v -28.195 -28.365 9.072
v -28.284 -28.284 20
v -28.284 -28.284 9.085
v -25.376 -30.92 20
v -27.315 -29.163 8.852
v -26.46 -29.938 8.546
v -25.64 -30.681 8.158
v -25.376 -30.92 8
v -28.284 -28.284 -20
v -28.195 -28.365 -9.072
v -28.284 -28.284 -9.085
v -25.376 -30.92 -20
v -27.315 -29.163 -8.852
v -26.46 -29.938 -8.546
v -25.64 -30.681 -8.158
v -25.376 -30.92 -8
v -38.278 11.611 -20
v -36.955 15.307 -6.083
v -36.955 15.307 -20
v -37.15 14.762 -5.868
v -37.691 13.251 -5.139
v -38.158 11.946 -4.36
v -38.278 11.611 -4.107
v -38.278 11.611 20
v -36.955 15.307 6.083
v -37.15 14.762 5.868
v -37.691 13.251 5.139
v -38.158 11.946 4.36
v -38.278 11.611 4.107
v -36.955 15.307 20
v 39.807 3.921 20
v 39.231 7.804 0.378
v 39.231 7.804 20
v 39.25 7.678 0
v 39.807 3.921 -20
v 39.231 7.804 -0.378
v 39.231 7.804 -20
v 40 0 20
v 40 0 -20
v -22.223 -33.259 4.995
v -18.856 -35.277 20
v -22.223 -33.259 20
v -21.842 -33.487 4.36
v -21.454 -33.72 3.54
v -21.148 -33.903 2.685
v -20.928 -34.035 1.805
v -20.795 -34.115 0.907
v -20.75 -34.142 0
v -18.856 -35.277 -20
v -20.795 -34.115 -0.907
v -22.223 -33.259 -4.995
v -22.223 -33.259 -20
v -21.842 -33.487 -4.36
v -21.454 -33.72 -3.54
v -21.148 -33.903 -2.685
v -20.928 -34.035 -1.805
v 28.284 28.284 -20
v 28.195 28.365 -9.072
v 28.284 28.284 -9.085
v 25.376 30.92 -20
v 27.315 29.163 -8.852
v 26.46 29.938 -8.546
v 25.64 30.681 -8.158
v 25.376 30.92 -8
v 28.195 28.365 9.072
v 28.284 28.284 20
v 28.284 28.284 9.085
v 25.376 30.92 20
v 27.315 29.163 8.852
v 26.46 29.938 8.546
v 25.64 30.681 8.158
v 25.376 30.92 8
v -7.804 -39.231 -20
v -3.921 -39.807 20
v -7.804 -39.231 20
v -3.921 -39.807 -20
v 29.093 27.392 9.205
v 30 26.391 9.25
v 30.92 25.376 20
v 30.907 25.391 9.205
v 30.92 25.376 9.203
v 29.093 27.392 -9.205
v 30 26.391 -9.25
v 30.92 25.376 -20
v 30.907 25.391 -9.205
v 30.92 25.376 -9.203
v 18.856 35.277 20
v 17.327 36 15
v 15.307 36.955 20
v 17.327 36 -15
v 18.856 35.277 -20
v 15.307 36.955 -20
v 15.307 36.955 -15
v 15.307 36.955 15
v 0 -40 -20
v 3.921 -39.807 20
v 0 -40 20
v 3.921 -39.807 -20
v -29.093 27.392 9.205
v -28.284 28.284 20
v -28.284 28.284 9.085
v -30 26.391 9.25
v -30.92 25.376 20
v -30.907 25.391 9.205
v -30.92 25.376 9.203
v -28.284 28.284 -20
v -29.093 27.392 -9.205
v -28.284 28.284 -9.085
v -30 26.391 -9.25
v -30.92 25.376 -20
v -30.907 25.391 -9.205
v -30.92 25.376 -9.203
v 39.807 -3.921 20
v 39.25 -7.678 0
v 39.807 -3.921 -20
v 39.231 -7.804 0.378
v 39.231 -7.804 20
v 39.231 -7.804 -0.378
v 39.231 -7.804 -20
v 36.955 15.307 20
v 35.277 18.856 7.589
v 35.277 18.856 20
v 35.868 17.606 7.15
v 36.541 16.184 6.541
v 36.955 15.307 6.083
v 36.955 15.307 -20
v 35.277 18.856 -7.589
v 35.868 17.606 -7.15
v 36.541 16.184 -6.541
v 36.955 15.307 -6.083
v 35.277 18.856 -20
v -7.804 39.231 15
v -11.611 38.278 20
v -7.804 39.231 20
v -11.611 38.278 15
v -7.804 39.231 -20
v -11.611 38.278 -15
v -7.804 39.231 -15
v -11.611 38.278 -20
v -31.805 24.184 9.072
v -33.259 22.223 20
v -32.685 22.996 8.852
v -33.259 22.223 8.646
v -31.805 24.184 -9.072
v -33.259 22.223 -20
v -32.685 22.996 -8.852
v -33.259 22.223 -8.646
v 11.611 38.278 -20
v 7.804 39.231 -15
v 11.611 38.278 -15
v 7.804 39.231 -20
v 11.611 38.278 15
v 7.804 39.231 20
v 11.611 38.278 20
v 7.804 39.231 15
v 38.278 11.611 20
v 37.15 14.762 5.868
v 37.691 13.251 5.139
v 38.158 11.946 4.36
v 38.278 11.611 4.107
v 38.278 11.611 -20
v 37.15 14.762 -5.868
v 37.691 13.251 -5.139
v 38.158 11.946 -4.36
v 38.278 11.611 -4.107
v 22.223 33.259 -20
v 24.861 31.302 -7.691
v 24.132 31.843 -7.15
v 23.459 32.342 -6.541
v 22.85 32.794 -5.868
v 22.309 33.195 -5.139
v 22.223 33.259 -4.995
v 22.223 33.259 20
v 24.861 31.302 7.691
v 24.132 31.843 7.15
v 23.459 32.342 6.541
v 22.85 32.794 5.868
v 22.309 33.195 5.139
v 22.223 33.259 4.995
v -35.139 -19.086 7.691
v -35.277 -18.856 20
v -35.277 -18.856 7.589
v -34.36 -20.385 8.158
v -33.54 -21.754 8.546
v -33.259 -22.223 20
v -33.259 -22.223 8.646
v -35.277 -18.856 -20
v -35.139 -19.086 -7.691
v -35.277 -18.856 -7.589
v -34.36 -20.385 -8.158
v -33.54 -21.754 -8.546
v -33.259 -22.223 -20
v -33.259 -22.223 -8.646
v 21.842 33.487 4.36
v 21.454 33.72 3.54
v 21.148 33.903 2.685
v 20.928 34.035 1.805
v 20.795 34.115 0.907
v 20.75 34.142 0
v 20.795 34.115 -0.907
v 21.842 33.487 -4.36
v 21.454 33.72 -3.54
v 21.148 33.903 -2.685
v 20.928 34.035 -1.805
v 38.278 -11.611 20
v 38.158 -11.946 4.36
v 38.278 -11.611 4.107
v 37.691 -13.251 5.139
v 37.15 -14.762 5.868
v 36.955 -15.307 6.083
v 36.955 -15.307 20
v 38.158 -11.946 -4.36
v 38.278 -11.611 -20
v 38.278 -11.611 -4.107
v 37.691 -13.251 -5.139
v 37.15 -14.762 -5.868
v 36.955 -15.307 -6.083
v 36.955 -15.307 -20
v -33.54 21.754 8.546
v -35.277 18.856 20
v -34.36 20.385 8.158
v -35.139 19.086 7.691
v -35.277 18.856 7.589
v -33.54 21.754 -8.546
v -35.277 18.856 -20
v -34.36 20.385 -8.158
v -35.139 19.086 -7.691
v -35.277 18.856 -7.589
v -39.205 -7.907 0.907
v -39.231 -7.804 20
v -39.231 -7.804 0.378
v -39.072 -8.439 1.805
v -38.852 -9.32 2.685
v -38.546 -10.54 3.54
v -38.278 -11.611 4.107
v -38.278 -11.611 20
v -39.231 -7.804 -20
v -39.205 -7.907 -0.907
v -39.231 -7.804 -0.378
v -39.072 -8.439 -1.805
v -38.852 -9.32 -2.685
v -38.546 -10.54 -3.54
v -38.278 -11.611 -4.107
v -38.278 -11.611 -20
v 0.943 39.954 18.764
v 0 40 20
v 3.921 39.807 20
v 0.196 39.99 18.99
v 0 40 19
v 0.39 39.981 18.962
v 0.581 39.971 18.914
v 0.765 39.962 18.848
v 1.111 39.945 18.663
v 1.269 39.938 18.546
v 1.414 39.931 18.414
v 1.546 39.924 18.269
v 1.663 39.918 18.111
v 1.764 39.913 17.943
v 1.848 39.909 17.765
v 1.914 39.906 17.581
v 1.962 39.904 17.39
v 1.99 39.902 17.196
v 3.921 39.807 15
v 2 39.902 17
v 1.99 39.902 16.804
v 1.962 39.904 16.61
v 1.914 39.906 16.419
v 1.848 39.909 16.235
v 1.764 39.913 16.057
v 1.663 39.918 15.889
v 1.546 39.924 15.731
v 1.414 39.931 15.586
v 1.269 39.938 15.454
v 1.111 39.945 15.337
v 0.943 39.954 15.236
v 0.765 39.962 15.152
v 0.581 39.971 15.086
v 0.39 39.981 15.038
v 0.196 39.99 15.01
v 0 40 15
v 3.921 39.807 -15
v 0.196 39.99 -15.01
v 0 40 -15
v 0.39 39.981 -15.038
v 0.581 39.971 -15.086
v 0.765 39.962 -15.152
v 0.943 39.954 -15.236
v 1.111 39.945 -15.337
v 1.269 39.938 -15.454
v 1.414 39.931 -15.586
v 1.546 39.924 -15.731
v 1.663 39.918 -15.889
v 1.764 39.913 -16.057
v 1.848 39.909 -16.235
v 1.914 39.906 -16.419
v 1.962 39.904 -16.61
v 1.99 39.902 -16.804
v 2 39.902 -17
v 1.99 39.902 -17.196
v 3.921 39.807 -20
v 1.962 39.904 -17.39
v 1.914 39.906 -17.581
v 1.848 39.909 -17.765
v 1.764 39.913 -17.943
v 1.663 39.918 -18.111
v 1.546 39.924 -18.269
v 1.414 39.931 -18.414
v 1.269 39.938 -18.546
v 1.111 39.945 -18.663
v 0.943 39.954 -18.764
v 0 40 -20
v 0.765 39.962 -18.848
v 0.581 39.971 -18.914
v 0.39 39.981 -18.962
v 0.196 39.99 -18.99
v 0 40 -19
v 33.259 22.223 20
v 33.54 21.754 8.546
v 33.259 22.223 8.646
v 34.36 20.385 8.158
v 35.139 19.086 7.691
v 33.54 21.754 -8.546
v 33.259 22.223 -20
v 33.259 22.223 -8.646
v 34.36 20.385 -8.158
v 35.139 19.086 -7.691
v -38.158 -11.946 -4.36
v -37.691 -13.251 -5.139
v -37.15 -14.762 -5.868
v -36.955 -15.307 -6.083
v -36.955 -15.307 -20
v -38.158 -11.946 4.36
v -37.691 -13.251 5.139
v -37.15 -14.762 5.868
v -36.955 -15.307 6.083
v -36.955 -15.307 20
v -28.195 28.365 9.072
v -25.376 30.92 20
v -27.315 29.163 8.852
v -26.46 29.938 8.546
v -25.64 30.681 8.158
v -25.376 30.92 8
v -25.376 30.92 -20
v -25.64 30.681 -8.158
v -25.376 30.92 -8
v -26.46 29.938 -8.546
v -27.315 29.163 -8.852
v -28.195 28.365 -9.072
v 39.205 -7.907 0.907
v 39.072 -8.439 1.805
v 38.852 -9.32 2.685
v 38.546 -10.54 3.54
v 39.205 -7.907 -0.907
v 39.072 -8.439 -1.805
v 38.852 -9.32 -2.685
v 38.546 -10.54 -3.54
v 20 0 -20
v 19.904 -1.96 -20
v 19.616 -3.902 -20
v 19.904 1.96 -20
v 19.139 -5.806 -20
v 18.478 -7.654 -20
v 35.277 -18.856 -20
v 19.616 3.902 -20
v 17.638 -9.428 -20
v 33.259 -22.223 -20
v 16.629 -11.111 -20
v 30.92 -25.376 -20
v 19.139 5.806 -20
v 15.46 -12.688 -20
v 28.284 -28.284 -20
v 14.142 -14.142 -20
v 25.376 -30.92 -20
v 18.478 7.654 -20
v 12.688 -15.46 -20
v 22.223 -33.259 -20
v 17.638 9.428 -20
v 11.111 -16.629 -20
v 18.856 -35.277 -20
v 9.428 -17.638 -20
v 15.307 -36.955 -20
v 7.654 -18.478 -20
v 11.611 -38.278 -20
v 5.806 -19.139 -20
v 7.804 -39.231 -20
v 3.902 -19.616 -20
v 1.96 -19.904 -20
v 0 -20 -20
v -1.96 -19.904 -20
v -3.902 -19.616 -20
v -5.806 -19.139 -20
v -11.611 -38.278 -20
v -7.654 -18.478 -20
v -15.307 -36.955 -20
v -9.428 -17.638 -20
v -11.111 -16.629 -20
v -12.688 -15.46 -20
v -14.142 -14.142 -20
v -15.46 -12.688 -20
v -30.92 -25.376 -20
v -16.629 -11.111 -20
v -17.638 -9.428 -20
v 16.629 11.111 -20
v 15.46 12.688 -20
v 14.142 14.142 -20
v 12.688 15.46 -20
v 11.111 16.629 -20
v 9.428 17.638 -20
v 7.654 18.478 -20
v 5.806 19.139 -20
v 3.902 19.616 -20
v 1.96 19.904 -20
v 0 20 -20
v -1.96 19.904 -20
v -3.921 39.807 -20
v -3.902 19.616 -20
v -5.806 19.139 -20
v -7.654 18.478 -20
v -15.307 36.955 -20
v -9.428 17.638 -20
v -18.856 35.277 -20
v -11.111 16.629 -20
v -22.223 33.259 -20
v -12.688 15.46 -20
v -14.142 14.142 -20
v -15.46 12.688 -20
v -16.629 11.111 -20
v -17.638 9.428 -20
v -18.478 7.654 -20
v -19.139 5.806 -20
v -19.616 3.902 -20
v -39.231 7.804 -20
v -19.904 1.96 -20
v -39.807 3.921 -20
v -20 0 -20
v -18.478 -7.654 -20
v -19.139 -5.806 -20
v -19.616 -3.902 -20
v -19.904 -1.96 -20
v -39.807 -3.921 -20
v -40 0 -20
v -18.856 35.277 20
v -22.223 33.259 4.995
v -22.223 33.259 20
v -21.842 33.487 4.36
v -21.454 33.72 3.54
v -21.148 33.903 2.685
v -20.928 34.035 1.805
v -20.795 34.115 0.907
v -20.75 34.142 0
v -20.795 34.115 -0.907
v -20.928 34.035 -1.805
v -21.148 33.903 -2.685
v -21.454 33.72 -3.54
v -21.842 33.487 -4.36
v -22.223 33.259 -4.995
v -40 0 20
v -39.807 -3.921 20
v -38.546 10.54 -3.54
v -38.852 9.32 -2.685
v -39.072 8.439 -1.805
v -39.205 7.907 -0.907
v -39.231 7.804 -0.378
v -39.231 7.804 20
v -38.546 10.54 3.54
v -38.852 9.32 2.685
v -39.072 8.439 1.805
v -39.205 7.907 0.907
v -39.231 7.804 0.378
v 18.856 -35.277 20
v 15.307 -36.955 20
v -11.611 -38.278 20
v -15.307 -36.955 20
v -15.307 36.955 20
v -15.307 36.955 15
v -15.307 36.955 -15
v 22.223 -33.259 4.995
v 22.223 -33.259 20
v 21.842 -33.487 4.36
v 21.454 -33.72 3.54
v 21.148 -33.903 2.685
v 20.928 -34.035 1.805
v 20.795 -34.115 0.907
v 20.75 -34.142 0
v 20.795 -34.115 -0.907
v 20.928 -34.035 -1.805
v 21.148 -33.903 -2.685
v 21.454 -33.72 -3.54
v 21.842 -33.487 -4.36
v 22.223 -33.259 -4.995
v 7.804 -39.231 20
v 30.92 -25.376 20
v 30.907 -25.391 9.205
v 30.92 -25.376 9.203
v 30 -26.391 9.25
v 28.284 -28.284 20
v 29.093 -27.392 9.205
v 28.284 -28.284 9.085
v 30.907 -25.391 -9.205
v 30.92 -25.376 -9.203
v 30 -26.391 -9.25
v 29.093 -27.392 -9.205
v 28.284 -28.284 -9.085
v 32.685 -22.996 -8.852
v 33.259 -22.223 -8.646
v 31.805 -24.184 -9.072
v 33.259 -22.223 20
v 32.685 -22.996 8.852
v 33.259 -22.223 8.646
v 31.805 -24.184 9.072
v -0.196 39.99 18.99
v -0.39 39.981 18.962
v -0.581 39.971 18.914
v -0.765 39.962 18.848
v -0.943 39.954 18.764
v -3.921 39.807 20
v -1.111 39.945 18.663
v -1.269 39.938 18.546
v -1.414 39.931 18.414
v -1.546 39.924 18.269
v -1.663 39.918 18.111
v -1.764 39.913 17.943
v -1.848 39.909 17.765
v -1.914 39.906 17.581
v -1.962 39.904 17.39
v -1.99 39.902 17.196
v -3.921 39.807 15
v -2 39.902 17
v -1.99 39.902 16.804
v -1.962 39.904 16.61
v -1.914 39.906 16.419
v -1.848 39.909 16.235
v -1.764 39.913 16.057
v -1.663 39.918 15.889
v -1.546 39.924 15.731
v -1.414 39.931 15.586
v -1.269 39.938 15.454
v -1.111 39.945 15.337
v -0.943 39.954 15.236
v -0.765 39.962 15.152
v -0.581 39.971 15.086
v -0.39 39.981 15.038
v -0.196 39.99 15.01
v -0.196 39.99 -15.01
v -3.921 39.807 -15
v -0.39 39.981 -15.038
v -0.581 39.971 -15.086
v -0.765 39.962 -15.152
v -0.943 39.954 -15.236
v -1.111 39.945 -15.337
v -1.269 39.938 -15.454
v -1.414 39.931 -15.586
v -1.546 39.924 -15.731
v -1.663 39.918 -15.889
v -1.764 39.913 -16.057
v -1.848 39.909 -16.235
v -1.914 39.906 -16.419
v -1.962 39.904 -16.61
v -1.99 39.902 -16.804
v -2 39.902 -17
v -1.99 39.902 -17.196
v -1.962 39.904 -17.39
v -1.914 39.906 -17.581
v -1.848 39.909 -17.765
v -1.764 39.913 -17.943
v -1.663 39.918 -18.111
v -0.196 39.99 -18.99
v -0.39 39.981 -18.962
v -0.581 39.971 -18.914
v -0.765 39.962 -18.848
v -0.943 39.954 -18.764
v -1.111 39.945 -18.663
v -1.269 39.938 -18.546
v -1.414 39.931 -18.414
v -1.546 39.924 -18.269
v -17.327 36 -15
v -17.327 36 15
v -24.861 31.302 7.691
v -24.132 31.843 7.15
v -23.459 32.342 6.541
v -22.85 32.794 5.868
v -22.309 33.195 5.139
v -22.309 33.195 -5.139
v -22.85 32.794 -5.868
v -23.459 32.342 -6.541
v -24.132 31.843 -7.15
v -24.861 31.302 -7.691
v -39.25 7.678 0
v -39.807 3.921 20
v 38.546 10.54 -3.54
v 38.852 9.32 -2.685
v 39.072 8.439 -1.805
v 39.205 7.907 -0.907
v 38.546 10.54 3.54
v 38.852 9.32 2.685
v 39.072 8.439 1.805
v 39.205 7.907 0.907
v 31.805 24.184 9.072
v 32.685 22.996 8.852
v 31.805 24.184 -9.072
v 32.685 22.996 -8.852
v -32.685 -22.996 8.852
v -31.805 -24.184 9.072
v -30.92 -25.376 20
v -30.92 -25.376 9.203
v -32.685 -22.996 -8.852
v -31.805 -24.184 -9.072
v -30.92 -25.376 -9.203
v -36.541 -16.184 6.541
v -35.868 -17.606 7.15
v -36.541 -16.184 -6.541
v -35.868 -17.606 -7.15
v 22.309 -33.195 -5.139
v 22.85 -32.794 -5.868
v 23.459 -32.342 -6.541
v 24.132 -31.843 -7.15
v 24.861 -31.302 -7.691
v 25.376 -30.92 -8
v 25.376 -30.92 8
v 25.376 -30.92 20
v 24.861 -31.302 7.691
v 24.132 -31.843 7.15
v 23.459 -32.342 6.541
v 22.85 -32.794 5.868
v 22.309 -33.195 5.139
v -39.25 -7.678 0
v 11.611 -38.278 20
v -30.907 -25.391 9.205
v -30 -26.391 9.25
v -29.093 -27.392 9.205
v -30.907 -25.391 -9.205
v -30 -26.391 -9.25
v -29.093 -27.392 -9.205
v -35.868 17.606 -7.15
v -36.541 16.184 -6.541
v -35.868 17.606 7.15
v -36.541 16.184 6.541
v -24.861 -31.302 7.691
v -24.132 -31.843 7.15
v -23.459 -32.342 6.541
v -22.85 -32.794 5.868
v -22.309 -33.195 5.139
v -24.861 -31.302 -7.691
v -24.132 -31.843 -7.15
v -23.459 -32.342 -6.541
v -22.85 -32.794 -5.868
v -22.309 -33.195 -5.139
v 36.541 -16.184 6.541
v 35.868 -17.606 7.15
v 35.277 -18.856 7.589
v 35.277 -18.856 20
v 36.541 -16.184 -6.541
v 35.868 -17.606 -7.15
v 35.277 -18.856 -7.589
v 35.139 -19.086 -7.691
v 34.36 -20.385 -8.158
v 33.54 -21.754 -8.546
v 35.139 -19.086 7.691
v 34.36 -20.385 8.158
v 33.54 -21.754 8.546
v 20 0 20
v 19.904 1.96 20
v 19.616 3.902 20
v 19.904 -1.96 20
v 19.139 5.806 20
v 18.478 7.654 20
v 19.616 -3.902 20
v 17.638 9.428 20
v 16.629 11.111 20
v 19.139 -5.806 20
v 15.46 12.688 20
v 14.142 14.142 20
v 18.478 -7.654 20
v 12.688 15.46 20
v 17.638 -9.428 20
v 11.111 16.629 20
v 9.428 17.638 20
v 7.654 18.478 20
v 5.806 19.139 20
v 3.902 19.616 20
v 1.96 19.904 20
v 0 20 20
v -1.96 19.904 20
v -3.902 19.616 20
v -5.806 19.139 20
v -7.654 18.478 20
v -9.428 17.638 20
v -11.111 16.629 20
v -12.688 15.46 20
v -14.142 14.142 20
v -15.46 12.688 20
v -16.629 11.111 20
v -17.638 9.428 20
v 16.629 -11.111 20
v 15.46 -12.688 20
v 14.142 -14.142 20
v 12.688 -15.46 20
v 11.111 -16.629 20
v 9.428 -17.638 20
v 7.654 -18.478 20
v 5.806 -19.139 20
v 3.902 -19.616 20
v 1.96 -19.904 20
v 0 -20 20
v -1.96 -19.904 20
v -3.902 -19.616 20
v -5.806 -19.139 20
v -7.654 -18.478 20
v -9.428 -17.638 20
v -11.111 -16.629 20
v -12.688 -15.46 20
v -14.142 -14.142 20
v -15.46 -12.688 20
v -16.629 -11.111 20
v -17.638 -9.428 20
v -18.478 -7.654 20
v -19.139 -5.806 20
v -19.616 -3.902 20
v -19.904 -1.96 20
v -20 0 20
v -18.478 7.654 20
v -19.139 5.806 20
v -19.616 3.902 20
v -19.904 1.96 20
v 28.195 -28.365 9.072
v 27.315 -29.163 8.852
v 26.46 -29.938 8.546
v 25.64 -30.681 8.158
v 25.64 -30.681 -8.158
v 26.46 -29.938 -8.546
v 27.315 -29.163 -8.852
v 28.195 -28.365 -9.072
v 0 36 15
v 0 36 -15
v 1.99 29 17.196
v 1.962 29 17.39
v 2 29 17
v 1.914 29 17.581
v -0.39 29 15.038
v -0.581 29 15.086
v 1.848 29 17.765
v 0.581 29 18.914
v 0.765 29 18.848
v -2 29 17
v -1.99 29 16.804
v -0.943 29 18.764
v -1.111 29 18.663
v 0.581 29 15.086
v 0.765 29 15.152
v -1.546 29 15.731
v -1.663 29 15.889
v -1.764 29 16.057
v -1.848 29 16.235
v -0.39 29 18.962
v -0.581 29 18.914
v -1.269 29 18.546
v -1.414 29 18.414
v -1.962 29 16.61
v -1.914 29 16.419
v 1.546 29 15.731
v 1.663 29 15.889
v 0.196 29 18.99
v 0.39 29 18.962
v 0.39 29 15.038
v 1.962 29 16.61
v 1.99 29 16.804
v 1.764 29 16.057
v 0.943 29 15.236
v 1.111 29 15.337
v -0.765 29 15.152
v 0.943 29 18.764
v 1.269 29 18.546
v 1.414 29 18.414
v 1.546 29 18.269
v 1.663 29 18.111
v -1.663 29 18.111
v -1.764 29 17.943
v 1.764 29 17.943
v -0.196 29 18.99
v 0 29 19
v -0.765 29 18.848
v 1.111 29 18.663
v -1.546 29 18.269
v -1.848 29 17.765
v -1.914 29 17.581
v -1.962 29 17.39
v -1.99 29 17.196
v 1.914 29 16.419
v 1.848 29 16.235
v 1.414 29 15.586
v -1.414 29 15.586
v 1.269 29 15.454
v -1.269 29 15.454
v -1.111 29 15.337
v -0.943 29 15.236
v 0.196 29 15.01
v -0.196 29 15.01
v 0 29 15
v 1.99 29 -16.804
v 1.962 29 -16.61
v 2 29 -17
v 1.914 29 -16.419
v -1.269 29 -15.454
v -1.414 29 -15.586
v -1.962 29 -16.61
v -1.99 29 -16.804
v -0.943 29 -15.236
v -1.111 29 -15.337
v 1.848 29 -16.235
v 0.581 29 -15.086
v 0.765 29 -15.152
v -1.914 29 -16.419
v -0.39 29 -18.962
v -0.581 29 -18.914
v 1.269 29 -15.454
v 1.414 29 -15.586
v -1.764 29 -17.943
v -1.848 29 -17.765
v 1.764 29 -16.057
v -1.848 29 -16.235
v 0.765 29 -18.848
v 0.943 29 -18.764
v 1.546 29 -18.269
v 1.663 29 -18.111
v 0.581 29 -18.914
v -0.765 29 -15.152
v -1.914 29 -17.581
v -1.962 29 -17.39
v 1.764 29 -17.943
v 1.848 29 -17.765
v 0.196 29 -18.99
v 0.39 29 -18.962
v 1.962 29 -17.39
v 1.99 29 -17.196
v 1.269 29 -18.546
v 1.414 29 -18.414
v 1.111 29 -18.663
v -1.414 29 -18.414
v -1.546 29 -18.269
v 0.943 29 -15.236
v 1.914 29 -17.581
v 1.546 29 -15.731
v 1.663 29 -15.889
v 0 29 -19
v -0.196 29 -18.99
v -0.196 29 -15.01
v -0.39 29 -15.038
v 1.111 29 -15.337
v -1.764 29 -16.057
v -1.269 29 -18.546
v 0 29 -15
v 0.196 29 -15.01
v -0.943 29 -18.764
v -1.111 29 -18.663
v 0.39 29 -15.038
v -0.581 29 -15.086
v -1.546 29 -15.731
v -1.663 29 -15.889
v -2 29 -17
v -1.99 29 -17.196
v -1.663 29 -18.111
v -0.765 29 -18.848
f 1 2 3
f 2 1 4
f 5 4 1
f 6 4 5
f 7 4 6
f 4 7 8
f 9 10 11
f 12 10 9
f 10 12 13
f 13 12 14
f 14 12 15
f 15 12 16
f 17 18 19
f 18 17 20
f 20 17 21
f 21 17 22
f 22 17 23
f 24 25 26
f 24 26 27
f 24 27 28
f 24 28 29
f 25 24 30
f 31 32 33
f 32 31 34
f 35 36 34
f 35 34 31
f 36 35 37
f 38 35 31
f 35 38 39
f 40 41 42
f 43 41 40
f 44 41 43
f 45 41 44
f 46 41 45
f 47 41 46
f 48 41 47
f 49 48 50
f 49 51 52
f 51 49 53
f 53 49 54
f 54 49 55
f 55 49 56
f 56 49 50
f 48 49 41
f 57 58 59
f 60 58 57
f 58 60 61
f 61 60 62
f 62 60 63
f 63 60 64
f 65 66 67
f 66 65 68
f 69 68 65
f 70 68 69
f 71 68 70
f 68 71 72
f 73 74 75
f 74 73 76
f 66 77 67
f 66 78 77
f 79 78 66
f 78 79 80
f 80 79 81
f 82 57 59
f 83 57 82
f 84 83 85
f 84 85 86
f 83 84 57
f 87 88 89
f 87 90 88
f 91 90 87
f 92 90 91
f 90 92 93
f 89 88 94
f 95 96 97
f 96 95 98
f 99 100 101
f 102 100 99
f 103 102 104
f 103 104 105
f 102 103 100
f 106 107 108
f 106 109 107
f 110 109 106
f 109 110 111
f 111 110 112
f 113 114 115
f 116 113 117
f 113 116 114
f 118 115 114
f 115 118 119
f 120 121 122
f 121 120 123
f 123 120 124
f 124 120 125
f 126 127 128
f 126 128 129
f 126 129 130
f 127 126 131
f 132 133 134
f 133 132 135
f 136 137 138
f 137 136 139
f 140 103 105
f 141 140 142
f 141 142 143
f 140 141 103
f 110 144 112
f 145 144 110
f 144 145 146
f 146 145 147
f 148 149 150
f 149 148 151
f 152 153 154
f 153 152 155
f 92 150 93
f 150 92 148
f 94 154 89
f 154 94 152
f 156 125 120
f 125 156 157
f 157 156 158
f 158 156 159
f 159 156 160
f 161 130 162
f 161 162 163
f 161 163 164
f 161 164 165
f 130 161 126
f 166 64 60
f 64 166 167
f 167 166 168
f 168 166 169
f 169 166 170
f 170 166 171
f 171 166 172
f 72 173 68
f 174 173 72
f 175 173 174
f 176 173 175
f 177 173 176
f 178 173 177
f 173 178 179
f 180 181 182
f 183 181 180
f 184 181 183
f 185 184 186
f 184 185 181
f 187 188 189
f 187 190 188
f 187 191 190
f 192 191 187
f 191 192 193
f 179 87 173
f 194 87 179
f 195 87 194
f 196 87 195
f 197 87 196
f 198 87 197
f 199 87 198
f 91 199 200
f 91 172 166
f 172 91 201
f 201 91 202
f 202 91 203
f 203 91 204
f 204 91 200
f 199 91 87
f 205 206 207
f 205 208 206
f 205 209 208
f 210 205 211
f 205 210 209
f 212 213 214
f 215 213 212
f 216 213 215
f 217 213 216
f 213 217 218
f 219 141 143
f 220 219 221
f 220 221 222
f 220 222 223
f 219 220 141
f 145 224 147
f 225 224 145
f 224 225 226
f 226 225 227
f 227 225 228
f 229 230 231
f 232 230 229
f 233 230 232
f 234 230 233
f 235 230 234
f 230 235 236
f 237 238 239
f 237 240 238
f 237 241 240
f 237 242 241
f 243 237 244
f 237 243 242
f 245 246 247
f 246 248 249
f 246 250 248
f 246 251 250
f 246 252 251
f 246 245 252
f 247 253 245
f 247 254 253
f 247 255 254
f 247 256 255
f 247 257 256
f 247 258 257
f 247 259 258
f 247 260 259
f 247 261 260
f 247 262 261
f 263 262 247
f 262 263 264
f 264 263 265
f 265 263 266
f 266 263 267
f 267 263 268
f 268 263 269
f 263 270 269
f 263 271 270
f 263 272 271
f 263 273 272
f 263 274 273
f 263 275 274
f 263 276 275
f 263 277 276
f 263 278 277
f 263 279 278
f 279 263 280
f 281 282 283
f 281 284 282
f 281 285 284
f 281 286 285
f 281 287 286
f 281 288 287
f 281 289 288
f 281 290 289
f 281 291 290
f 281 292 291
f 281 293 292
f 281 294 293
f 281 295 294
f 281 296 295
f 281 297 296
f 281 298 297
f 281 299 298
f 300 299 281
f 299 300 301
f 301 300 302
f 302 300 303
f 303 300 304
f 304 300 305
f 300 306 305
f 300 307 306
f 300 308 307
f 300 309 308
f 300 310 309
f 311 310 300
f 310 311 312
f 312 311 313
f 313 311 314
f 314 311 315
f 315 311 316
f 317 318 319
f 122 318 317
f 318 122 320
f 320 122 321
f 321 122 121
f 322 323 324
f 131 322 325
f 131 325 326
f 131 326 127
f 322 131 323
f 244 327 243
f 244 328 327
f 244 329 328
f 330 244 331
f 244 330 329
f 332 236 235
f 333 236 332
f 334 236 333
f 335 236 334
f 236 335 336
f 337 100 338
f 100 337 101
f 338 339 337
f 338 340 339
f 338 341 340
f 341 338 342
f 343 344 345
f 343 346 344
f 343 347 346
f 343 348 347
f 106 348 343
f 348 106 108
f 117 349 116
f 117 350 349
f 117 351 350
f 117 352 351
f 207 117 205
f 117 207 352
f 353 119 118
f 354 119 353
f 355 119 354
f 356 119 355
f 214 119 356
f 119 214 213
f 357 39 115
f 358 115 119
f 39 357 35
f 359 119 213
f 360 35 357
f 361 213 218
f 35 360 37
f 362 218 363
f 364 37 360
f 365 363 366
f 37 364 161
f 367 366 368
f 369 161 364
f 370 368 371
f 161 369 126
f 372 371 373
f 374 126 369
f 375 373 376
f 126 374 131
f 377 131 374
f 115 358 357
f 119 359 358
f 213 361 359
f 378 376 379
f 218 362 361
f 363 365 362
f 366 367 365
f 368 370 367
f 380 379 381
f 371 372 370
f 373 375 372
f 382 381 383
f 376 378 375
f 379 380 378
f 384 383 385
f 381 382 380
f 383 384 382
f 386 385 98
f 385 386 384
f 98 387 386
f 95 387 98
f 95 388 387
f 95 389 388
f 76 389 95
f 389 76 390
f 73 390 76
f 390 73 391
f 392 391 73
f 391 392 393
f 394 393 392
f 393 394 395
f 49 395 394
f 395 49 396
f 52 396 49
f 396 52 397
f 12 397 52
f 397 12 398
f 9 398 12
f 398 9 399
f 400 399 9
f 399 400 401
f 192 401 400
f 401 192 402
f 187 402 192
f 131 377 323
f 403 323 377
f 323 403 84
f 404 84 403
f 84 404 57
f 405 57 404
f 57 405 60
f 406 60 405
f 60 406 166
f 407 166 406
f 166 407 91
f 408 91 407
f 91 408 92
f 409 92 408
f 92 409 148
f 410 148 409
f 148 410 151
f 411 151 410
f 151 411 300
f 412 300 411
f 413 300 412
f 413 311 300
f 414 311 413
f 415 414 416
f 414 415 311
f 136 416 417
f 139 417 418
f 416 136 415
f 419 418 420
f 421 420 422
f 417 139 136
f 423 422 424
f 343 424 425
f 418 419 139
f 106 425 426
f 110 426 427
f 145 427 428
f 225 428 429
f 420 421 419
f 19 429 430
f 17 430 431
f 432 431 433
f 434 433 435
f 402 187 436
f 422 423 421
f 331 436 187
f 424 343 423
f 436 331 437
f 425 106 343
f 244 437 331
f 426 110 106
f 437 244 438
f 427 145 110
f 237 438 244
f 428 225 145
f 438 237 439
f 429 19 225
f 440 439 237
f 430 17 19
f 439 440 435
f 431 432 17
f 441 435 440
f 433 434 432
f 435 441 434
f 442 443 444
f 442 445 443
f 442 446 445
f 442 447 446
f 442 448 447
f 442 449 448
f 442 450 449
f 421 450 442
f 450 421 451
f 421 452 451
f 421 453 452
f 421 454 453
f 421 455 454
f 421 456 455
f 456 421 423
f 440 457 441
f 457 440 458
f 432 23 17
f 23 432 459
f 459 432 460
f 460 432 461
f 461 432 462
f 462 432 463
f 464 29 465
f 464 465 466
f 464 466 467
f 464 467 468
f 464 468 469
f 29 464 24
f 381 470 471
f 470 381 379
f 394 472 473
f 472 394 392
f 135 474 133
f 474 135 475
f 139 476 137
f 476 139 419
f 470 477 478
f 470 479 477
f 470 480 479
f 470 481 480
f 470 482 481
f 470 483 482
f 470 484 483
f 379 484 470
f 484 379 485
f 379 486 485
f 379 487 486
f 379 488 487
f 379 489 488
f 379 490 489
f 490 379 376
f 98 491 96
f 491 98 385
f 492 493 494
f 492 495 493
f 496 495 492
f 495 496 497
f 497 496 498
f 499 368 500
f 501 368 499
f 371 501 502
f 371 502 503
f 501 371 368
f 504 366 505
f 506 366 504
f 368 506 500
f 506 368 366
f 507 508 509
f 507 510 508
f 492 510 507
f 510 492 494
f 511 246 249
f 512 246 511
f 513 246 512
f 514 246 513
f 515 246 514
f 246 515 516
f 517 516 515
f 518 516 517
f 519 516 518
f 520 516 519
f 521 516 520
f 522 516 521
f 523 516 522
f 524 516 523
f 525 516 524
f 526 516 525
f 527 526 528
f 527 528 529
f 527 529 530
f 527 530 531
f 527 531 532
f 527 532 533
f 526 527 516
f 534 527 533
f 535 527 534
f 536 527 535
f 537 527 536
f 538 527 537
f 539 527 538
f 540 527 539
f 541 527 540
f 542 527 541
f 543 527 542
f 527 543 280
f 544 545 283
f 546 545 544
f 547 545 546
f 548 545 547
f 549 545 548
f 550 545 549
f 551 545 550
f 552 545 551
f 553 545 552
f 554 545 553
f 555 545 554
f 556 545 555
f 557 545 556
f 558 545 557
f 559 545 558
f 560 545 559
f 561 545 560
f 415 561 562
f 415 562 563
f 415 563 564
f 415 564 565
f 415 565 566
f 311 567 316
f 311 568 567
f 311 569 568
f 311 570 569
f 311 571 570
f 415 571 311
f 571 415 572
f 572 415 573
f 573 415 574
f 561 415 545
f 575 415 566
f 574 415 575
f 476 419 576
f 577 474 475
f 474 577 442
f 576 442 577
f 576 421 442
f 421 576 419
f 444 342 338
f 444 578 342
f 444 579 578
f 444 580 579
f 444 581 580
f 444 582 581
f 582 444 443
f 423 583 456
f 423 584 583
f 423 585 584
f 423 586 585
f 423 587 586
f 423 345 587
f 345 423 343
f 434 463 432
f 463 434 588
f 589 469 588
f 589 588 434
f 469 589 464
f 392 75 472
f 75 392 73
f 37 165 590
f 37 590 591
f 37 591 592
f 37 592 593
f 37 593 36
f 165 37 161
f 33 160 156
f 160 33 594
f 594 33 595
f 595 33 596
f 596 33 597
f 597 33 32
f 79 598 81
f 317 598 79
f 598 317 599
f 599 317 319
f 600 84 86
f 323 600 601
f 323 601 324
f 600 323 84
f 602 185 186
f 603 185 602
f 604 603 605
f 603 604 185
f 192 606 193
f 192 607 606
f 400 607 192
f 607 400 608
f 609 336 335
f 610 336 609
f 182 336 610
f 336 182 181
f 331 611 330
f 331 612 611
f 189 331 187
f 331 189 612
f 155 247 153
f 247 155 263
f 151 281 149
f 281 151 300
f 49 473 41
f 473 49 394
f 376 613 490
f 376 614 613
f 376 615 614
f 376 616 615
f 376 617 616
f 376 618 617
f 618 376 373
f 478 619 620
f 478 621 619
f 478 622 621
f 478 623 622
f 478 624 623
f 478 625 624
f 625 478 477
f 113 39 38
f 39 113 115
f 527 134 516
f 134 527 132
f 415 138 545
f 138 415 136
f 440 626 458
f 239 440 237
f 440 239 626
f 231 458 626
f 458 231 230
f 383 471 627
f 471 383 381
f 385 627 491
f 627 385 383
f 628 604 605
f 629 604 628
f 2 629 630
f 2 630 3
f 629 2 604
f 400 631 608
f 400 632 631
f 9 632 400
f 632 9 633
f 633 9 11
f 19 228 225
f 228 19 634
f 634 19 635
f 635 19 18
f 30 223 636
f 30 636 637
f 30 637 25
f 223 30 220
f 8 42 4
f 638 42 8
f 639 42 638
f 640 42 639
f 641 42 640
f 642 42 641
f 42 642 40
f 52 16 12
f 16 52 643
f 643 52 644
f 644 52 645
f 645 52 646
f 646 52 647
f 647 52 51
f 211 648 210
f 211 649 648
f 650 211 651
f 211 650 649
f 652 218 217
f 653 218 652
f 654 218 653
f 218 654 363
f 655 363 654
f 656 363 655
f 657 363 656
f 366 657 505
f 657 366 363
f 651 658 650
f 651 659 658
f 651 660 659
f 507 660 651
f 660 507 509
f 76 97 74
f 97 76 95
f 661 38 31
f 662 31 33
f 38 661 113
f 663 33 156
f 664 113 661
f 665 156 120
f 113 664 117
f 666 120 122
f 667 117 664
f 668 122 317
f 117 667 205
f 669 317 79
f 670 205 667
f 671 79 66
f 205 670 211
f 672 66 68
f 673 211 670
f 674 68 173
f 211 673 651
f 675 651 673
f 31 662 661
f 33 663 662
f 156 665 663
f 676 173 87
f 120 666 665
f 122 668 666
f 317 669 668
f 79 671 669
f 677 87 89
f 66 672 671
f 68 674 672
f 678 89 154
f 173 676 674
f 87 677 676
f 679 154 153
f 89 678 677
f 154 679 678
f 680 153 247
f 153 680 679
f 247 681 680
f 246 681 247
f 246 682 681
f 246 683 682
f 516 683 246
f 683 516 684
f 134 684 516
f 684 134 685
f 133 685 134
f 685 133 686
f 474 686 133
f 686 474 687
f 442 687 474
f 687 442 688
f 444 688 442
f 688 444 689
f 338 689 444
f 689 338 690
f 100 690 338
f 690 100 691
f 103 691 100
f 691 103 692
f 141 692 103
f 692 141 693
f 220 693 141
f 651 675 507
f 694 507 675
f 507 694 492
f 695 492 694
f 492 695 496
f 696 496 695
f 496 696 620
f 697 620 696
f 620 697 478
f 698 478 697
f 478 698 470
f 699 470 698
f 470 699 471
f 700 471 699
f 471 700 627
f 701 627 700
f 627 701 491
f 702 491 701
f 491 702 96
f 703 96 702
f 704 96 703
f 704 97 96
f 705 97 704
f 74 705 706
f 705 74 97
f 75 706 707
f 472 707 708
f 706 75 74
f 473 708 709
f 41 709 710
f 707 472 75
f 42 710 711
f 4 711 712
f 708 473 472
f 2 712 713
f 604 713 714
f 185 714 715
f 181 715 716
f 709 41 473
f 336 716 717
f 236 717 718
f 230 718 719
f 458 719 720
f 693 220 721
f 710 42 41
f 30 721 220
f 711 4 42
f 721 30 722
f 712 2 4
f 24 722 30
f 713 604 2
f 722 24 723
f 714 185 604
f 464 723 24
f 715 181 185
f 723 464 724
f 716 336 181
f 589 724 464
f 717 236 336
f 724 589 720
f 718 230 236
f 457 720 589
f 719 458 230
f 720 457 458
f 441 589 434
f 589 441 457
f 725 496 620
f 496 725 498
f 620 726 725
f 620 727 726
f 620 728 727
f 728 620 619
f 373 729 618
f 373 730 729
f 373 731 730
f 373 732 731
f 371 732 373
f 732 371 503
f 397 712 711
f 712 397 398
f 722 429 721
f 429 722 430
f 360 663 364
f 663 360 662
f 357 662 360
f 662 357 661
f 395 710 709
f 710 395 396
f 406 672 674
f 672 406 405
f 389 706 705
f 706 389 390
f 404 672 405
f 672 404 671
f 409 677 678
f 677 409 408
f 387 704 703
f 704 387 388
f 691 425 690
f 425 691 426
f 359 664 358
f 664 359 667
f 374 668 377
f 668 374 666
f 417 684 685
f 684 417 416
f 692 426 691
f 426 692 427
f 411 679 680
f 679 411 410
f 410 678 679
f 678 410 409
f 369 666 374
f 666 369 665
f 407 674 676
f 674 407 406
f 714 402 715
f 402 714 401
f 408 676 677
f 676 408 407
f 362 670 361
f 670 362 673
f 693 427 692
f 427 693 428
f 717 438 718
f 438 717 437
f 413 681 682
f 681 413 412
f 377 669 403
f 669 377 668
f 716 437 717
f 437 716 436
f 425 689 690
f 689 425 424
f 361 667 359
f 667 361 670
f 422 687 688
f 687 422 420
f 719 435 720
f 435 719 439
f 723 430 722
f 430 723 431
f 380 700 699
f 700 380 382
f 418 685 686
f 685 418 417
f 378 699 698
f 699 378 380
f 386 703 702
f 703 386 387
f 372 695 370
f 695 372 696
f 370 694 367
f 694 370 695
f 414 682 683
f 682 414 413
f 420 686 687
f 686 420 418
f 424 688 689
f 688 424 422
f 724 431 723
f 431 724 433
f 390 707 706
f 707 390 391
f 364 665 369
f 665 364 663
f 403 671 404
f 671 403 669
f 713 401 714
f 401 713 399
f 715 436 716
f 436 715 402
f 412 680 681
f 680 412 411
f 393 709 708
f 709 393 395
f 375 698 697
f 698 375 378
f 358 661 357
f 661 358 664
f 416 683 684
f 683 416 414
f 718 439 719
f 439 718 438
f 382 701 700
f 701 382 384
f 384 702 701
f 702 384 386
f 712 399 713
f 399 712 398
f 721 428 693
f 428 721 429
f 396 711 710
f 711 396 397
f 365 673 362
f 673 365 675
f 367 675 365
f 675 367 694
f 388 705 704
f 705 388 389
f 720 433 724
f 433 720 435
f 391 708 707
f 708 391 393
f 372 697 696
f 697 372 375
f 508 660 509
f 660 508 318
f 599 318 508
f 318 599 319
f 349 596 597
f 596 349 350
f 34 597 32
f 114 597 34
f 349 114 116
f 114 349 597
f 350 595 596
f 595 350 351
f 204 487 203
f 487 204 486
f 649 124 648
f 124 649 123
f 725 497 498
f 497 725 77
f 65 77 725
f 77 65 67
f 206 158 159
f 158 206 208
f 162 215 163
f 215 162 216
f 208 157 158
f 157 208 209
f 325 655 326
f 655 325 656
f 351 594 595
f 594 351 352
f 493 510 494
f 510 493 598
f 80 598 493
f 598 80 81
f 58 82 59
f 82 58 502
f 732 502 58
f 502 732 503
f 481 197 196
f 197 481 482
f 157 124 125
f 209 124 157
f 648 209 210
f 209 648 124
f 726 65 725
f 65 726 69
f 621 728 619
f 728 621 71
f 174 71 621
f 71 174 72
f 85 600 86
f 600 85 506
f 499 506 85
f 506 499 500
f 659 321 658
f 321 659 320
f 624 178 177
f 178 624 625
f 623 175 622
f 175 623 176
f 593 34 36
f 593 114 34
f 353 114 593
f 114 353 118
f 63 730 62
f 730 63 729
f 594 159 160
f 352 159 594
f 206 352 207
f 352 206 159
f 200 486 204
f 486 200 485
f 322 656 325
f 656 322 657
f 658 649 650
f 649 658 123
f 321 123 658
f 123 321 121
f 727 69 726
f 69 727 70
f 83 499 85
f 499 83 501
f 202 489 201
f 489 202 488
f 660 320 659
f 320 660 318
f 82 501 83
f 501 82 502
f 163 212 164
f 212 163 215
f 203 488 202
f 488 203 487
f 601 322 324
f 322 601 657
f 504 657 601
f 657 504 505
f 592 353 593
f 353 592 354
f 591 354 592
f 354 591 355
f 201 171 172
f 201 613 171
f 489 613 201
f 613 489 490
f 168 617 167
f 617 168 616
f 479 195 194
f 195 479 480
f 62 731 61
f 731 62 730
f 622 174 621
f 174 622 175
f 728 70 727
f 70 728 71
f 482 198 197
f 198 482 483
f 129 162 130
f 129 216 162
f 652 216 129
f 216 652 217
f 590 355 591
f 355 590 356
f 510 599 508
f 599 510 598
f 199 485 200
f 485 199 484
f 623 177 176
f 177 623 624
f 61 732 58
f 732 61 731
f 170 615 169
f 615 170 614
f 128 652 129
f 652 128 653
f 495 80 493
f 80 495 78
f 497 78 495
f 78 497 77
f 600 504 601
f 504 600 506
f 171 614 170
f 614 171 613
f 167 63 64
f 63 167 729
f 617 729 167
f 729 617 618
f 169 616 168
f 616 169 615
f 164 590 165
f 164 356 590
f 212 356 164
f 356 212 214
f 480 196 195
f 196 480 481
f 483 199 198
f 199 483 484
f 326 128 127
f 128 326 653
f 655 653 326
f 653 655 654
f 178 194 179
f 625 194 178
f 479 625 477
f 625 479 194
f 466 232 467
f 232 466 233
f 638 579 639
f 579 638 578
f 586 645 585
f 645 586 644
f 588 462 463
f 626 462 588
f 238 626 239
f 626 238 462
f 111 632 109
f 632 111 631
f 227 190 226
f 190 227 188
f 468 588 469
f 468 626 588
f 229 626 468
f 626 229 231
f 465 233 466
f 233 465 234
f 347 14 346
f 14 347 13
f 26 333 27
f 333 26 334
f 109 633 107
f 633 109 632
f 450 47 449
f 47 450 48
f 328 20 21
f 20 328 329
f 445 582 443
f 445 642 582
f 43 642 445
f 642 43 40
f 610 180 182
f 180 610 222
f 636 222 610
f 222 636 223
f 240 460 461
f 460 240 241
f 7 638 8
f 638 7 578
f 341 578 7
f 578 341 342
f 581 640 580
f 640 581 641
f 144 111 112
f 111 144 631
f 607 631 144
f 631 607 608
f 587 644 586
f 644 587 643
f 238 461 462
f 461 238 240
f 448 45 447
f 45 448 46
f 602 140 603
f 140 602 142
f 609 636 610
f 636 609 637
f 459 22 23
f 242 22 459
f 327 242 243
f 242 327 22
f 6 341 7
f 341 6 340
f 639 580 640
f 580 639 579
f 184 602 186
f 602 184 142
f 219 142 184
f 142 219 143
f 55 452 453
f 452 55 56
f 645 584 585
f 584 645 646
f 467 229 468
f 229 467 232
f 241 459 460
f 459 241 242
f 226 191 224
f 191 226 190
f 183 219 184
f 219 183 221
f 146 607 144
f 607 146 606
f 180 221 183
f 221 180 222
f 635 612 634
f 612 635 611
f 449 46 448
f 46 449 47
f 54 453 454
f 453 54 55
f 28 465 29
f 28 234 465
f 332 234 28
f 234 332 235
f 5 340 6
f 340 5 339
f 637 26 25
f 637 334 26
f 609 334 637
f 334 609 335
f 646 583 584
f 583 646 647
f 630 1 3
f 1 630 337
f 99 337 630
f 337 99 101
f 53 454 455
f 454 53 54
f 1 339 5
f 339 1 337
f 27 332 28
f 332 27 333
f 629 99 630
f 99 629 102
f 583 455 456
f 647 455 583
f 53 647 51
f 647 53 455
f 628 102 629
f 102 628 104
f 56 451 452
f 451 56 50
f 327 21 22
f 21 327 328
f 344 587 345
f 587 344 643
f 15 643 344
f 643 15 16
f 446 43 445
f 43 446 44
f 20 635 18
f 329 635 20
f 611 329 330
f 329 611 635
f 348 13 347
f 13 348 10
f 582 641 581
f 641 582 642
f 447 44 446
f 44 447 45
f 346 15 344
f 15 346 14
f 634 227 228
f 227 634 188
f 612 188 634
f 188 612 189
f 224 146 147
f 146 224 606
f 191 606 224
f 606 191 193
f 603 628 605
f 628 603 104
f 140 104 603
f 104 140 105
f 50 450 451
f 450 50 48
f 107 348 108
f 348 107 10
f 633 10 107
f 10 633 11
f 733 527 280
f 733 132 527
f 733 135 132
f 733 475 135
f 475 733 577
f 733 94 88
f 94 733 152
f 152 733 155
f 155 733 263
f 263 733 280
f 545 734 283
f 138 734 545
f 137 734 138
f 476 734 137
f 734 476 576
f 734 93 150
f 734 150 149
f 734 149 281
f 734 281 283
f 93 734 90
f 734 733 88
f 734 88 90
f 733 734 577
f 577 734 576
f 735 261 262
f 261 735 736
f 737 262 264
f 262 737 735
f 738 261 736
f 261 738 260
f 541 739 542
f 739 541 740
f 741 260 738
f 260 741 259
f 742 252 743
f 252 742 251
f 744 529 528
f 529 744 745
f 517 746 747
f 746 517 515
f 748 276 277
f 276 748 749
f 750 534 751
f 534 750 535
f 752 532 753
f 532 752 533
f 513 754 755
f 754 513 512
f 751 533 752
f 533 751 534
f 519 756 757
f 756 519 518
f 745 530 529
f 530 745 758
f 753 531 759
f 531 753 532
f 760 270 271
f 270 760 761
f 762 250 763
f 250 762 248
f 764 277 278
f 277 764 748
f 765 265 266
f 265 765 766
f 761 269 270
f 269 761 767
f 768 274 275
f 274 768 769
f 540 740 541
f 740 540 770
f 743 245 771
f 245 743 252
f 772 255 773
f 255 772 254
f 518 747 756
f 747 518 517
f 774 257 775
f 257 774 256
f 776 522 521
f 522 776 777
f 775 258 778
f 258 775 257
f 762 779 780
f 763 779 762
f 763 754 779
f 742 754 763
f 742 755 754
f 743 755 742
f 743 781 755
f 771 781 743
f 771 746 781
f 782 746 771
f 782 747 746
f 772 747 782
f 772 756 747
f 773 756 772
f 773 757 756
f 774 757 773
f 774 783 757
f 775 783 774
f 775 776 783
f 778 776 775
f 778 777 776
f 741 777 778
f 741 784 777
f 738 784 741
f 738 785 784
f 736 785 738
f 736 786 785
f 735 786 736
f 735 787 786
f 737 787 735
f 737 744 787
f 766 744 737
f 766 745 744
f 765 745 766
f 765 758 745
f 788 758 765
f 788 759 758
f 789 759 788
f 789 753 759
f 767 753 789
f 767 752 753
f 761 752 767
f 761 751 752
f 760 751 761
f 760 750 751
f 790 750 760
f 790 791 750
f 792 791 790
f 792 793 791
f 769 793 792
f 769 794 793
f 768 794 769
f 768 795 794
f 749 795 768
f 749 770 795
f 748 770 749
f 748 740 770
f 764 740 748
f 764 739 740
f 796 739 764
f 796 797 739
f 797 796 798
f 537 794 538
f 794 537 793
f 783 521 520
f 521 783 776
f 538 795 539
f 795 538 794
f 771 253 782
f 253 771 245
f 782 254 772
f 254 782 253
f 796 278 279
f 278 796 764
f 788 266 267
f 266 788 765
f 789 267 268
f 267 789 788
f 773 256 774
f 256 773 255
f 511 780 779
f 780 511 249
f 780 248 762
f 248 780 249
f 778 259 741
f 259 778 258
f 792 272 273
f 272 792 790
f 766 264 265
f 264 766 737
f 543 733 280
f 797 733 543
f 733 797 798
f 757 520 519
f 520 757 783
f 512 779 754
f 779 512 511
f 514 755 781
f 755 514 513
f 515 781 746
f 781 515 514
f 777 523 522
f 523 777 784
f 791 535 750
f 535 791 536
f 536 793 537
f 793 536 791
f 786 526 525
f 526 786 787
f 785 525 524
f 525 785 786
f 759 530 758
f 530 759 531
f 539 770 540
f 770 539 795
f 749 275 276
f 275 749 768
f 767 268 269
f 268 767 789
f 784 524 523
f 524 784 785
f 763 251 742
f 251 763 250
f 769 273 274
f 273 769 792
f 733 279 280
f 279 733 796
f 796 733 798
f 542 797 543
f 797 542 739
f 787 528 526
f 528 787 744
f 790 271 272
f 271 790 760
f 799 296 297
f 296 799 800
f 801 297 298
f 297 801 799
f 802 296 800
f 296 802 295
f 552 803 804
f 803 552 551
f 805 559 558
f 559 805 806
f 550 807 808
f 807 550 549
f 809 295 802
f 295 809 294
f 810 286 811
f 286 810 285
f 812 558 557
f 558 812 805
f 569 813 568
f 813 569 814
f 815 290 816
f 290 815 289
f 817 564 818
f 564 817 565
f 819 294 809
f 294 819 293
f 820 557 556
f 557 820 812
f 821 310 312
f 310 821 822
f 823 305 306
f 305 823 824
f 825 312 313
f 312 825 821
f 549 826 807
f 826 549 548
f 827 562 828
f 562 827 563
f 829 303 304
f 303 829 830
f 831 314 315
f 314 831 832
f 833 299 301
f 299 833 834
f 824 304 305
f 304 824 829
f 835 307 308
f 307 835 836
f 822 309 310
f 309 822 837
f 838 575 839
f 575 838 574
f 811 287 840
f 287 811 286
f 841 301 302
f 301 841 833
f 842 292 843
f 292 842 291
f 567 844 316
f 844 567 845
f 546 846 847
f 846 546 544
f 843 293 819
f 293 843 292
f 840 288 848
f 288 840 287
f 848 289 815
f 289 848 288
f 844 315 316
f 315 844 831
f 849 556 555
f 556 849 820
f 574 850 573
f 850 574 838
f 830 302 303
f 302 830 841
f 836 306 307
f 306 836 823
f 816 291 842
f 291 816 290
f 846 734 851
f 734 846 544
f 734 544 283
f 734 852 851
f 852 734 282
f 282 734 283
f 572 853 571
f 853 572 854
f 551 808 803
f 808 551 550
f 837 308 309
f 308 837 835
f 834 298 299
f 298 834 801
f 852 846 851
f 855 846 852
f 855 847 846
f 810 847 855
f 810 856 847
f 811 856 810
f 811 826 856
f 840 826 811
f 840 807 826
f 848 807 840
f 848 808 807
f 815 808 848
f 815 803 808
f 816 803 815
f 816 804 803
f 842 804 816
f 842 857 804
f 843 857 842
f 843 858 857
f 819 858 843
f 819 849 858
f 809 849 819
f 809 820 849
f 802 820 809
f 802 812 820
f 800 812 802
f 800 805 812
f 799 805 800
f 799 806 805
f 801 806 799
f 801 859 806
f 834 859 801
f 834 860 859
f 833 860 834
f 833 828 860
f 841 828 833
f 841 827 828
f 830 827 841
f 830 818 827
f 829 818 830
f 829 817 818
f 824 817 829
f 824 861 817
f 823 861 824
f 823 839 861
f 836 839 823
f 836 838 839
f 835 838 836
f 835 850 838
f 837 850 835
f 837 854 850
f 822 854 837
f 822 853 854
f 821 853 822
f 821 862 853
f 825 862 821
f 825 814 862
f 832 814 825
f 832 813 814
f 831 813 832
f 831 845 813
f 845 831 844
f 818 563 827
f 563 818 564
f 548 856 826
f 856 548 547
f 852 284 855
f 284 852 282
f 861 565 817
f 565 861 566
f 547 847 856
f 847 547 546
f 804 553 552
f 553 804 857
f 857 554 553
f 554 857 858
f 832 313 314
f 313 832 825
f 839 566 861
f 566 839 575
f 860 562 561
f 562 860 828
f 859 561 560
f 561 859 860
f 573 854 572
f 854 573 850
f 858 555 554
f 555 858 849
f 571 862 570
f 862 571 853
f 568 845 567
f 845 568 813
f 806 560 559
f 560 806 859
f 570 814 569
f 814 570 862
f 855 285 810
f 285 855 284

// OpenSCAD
// COBRA Vertebra - T6 V12
// Height: 40.0mm, OD: 80.0mm

$fn = 64;

difference() {
    // Outer cylinder
    cylinder(h=40.0, d=80.0, center=true);
    
    // Inner channel
    cylinder(h=42.0, d=40.0, center=true);

    // Battery cavity 1
    rotate([0, 0, 0])
    translate([30.0, 0, 0])
    rotate([90, 0, 0])
    cylinder(h=74.0, d=18.5, center=true);

    // Battery cavity 2
    rotate([0, 0, 180])
    translate([30.0, 0, 0])
    rotate([90, 0, 0])
    cylinder(h=74.0, d=18.5, center=true);

    // Solar panel cavity
    translate([0, 38.0, 0])
    cube([50, 4, 30], center=true);

    // Pivot holes
    translate([0, 40.0, 17.0])
    rotate([90, 0, 0])
    cylinder(h=22.0, d=4, center=true);
    
    translate([0, 40.0, -17.0])
    rotate([90, 0, 0])
    cylinder(h=22.0, d=4, center=true);
}
